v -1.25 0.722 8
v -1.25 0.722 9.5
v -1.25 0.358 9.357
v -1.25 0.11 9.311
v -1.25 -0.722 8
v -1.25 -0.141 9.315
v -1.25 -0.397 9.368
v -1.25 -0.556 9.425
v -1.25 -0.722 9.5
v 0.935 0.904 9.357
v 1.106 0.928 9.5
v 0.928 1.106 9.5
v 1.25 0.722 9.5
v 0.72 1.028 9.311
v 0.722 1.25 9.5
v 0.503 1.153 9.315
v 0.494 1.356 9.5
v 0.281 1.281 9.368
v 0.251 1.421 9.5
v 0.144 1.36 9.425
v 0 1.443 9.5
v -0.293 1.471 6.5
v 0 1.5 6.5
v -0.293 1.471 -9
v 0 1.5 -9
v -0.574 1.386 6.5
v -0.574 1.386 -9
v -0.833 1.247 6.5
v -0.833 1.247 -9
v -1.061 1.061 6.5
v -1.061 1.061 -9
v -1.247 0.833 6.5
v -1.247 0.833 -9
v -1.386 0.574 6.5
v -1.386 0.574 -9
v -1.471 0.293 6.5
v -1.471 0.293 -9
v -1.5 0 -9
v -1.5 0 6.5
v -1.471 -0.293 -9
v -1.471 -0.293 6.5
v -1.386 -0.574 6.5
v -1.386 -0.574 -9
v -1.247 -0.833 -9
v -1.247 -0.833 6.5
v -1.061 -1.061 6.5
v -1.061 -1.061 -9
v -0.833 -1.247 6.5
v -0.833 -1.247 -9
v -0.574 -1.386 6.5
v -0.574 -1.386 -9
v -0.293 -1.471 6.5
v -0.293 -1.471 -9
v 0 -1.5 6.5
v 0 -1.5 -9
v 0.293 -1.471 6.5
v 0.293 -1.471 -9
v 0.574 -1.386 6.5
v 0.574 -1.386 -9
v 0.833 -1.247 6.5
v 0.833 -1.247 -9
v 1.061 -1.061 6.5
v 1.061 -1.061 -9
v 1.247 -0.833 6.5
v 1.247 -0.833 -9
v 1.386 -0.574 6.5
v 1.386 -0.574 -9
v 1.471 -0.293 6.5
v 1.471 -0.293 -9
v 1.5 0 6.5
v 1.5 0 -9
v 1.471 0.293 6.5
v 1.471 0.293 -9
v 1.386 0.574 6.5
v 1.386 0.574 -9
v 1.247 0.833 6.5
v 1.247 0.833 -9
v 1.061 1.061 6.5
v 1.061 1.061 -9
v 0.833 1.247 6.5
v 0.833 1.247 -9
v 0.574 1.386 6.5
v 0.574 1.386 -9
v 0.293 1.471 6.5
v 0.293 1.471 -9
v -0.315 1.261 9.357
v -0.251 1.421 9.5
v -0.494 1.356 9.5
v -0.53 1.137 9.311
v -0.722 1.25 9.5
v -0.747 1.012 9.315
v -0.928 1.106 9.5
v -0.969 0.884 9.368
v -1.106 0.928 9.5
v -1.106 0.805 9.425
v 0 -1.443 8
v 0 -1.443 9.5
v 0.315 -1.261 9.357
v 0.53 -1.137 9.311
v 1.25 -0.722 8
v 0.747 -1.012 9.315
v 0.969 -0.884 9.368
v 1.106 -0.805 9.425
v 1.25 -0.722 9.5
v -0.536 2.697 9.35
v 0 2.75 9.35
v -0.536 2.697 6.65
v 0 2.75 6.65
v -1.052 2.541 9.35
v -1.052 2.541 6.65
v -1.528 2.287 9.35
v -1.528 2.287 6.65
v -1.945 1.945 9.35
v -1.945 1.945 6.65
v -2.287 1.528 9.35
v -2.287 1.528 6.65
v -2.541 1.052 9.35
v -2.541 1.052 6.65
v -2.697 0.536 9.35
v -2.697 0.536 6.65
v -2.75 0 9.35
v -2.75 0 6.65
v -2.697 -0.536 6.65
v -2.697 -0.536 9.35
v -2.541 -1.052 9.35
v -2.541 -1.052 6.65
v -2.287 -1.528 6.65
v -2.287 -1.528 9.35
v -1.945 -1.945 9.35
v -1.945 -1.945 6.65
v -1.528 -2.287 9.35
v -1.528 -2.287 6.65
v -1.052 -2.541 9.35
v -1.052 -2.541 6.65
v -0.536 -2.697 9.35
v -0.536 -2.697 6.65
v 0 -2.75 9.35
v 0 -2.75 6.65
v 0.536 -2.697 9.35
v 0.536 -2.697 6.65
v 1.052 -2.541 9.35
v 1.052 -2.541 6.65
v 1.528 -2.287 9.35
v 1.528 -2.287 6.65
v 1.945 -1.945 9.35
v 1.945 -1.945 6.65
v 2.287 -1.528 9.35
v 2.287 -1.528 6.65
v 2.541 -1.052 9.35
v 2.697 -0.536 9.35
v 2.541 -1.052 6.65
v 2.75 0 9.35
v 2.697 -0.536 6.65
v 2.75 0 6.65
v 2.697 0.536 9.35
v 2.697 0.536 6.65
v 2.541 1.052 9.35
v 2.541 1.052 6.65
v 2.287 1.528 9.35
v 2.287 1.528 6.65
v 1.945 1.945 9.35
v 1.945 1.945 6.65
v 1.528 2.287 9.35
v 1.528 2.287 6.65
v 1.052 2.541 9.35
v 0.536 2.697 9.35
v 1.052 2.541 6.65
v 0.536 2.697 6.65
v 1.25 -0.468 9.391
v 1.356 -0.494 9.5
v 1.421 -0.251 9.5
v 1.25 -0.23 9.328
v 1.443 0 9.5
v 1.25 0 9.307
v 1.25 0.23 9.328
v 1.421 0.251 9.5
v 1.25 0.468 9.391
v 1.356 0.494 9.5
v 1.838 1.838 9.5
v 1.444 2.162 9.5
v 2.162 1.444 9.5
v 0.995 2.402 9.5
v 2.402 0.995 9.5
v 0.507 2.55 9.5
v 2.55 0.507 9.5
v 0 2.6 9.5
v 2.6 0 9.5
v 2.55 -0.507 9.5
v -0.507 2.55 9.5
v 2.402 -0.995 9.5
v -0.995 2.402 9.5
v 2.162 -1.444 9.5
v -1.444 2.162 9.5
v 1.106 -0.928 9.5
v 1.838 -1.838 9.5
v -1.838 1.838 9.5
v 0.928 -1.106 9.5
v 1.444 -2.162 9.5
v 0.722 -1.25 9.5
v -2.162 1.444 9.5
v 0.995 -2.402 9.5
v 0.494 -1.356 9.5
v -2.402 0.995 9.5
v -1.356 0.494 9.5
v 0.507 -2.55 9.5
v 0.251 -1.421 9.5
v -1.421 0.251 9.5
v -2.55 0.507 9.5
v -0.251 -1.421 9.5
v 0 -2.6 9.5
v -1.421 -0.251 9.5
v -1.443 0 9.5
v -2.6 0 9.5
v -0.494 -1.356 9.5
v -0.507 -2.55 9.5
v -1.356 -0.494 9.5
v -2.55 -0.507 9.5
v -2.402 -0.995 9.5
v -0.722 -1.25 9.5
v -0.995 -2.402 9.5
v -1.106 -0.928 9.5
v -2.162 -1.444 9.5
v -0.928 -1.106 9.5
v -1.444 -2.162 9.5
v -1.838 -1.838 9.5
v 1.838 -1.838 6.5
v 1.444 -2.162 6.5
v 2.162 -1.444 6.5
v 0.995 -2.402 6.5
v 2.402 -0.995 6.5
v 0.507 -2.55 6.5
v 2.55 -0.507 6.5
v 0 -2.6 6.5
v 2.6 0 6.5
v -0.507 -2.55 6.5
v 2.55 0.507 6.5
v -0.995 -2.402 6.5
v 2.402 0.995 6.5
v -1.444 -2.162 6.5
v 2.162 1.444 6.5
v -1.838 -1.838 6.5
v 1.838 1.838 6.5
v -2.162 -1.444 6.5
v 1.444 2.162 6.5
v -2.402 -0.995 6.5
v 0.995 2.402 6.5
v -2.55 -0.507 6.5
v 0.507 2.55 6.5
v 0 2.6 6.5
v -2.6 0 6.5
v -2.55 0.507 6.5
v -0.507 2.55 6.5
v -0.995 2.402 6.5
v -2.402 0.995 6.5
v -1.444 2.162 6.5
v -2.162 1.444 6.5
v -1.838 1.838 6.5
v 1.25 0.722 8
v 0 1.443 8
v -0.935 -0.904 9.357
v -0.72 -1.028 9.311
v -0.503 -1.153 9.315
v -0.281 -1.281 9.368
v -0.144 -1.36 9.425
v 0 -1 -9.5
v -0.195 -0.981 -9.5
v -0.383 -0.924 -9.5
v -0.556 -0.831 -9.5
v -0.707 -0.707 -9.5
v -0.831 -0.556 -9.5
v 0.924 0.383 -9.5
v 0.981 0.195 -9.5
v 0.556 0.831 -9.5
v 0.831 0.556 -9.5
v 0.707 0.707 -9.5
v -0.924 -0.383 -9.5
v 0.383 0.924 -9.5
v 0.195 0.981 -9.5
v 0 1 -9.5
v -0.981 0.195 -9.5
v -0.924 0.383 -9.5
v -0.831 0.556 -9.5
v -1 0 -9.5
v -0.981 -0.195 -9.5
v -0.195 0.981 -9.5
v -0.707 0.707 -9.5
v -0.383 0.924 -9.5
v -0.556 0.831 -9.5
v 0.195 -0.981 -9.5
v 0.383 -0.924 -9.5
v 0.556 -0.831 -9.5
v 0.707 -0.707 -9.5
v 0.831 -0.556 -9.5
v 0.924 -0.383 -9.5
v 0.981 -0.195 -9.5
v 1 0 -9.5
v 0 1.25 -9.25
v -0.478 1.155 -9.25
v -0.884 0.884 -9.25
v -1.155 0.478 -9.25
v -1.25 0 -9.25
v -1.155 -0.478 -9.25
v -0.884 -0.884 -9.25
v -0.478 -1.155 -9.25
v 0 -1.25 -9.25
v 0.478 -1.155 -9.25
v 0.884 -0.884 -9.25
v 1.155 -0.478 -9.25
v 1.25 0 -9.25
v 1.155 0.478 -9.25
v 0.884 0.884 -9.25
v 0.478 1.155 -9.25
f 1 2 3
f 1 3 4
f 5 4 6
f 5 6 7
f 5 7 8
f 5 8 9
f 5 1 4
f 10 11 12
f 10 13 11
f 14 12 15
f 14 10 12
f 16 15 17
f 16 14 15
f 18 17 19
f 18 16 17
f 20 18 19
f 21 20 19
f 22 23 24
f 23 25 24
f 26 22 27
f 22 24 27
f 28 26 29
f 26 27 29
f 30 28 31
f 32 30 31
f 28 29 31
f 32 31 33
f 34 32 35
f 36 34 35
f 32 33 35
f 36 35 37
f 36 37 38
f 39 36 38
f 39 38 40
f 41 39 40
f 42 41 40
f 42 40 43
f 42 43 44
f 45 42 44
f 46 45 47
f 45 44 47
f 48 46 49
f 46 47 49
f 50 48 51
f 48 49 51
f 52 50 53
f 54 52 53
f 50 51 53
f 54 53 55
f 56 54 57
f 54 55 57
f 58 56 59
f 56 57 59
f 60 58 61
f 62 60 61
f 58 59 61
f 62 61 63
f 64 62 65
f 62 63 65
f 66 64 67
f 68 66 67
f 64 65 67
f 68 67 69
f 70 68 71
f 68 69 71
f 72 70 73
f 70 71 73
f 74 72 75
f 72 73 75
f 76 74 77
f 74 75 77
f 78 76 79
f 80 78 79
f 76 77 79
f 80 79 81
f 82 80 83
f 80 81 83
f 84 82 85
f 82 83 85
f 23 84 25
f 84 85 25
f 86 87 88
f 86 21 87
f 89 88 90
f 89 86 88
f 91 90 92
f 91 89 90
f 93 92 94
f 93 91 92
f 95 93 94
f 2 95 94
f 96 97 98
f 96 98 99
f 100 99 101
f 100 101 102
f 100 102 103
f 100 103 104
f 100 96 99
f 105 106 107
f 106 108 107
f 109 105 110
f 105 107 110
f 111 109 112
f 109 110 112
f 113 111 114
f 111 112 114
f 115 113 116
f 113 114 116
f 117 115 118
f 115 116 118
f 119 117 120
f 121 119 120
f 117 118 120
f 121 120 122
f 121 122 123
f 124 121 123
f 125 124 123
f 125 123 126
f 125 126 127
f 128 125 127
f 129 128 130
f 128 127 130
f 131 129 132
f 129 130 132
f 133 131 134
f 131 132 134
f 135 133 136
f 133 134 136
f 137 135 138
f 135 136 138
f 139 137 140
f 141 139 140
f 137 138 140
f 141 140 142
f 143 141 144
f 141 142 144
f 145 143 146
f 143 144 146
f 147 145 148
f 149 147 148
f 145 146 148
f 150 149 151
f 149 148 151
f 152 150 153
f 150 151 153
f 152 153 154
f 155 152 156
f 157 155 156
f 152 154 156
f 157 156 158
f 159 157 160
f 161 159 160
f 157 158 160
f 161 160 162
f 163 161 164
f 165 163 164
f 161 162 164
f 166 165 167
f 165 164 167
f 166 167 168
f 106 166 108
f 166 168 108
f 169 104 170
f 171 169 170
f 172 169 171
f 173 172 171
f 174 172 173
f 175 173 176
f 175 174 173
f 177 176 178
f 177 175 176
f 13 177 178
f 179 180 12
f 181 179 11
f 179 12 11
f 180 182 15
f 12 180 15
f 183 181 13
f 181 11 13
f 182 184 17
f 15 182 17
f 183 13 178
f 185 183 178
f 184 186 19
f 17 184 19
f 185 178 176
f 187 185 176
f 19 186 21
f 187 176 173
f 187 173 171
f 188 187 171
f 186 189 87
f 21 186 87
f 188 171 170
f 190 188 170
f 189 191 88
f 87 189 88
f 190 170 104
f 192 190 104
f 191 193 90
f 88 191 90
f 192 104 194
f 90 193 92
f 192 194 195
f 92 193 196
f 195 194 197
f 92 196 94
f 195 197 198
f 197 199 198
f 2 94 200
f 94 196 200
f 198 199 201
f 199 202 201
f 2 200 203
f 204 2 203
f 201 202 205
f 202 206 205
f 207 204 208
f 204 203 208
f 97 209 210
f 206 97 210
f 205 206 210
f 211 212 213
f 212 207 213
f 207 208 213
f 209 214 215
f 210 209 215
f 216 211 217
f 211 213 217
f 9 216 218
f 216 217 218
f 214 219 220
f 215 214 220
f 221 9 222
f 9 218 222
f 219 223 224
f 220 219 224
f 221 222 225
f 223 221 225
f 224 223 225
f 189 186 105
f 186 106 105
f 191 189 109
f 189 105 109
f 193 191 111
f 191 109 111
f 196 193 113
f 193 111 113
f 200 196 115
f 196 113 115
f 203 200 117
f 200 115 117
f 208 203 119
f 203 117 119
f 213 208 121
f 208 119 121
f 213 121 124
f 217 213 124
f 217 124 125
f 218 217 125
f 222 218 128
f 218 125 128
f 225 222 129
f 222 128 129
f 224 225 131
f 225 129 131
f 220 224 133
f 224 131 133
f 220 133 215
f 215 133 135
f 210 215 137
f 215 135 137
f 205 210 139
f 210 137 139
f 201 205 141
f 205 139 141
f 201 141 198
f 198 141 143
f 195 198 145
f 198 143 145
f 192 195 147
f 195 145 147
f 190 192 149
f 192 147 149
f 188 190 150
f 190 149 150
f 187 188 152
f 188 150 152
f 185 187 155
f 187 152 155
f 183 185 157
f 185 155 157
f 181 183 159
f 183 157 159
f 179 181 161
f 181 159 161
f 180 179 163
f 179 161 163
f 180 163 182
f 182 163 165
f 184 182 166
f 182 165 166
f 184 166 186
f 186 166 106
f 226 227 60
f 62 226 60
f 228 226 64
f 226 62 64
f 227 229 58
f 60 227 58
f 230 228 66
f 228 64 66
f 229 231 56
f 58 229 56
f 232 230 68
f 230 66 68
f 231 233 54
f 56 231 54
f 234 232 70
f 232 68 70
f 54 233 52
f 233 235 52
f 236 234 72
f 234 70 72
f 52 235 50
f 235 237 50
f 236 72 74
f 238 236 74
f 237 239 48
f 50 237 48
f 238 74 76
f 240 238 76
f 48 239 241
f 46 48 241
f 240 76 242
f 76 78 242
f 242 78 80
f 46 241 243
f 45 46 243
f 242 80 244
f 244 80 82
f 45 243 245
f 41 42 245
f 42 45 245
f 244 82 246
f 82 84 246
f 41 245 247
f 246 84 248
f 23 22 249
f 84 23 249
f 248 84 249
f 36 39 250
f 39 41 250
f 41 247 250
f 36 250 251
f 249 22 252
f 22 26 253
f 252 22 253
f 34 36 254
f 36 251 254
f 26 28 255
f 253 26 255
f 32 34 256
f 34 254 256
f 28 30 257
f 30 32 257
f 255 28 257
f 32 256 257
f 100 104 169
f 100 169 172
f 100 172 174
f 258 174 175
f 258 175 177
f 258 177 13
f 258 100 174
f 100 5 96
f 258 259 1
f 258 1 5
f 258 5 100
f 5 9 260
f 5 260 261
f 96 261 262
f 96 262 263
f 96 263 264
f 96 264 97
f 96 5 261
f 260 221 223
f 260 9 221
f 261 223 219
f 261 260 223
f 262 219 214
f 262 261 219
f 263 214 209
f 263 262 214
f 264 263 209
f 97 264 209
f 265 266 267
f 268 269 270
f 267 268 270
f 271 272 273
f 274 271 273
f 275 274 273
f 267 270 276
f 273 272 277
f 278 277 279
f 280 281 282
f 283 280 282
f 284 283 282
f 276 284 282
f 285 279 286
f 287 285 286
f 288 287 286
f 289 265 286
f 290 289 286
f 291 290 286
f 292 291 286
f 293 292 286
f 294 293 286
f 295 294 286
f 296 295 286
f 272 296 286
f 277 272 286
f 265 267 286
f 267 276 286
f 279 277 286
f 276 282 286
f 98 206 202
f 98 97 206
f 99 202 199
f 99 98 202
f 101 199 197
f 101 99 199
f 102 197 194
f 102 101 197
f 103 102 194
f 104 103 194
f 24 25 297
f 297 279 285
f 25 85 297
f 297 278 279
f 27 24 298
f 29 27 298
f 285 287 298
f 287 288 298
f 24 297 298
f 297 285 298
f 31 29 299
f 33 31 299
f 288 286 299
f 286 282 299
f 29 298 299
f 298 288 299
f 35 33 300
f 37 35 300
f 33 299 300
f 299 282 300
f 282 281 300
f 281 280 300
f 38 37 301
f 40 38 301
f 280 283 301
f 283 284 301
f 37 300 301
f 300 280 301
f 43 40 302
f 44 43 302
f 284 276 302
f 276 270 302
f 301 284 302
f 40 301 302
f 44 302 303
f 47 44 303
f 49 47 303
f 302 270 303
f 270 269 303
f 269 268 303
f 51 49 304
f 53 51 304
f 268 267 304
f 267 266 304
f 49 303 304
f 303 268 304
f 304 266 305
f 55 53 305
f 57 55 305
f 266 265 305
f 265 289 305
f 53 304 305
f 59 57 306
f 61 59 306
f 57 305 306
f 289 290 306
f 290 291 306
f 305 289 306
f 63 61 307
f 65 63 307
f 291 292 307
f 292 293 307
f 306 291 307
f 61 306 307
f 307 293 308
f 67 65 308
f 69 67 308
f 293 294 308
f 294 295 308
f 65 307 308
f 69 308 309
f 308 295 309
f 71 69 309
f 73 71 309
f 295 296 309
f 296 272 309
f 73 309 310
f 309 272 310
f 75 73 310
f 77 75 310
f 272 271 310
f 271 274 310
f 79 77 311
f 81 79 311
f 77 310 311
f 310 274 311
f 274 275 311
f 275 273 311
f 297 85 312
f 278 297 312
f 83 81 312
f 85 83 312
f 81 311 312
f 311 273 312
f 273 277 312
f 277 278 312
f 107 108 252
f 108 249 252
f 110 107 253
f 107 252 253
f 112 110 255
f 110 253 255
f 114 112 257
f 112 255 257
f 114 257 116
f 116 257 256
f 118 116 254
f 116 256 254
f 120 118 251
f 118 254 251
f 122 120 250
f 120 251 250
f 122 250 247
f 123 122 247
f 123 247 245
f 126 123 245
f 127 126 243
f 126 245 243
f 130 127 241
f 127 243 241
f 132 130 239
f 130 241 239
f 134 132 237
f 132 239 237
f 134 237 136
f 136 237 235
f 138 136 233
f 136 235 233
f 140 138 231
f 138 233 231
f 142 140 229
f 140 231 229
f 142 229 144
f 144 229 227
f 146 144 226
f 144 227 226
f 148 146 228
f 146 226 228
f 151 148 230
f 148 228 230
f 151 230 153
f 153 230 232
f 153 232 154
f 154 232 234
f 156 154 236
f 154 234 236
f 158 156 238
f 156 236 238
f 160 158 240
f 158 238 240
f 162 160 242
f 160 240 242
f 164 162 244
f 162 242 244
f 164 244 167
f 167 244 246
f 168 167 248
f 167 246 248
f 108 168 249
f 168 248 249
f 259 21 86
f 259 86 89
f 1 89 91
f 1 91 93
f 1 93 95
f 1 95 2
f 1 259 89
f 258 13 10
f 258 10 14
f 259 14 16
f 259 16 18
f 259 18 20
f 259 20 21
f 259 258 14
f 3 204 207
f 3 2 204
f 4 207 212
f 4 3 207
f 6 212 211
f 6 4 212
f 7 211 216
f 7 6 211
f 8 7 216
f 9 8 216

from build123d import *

# Parameters (mm, degrees)
CUT_EXTRUDE1_START = -1.5
CUT_EXTRUDE1_DEPTH = 1.5
SKETCH4_R          = 1.443375673
CUT_EXTRUDE2_DEPTH = 0.5
CUT_EXTRUDE2_TAPER = 45


with BuildPart() as part:
    # Sketch2 → Revolve1 (revolve)
    with BuildSketch(Plane(origin=(0, 0, 0), x_dir=(0, 0, -1), z_dir=(1, 0, 0))):
        Polygon((-9.35, 2.75), (-6.65, 2.75), (-6.5, 2.6), (-6.5, 1.5), (9, 1.5), (9.5, 1), (9.5, 0), (-9.5, 0), (-9.5, 2.6), align=None)
    revolve(axis=Axis((0, 0, -9.5), (0, 0, 1)))

    # Sketch3 → Cut-Extrude1 (cut)
    with BuildSketch(Plane.XY.offset(9.5).offset(CUT_EXTRUDE1_START)):
        Polygon((0, 1.443375673), (-1.25, 0.721687836), (-1.25, -0.721687836), (0, -1.443375673), (1.25, -0.721687836), (1.25, 0.721687836), align=None)
    extrude(amount=CUT_EXTRUDE1_DEPTH, mode=Mode.SUBTRACT)

    # Sketch4 → Cut-Extrude2 (cut)
    with BuildSketch(Plane.XY.offset(9.5)):
        Circle(SKETCH4_R)
    extrude(amount=-CUT_EXTRUDE2_DEPTH, taper=CUT_EXTRUDE2_TAPER, mode=Mode.SUBTRACT)


solid = part.part
